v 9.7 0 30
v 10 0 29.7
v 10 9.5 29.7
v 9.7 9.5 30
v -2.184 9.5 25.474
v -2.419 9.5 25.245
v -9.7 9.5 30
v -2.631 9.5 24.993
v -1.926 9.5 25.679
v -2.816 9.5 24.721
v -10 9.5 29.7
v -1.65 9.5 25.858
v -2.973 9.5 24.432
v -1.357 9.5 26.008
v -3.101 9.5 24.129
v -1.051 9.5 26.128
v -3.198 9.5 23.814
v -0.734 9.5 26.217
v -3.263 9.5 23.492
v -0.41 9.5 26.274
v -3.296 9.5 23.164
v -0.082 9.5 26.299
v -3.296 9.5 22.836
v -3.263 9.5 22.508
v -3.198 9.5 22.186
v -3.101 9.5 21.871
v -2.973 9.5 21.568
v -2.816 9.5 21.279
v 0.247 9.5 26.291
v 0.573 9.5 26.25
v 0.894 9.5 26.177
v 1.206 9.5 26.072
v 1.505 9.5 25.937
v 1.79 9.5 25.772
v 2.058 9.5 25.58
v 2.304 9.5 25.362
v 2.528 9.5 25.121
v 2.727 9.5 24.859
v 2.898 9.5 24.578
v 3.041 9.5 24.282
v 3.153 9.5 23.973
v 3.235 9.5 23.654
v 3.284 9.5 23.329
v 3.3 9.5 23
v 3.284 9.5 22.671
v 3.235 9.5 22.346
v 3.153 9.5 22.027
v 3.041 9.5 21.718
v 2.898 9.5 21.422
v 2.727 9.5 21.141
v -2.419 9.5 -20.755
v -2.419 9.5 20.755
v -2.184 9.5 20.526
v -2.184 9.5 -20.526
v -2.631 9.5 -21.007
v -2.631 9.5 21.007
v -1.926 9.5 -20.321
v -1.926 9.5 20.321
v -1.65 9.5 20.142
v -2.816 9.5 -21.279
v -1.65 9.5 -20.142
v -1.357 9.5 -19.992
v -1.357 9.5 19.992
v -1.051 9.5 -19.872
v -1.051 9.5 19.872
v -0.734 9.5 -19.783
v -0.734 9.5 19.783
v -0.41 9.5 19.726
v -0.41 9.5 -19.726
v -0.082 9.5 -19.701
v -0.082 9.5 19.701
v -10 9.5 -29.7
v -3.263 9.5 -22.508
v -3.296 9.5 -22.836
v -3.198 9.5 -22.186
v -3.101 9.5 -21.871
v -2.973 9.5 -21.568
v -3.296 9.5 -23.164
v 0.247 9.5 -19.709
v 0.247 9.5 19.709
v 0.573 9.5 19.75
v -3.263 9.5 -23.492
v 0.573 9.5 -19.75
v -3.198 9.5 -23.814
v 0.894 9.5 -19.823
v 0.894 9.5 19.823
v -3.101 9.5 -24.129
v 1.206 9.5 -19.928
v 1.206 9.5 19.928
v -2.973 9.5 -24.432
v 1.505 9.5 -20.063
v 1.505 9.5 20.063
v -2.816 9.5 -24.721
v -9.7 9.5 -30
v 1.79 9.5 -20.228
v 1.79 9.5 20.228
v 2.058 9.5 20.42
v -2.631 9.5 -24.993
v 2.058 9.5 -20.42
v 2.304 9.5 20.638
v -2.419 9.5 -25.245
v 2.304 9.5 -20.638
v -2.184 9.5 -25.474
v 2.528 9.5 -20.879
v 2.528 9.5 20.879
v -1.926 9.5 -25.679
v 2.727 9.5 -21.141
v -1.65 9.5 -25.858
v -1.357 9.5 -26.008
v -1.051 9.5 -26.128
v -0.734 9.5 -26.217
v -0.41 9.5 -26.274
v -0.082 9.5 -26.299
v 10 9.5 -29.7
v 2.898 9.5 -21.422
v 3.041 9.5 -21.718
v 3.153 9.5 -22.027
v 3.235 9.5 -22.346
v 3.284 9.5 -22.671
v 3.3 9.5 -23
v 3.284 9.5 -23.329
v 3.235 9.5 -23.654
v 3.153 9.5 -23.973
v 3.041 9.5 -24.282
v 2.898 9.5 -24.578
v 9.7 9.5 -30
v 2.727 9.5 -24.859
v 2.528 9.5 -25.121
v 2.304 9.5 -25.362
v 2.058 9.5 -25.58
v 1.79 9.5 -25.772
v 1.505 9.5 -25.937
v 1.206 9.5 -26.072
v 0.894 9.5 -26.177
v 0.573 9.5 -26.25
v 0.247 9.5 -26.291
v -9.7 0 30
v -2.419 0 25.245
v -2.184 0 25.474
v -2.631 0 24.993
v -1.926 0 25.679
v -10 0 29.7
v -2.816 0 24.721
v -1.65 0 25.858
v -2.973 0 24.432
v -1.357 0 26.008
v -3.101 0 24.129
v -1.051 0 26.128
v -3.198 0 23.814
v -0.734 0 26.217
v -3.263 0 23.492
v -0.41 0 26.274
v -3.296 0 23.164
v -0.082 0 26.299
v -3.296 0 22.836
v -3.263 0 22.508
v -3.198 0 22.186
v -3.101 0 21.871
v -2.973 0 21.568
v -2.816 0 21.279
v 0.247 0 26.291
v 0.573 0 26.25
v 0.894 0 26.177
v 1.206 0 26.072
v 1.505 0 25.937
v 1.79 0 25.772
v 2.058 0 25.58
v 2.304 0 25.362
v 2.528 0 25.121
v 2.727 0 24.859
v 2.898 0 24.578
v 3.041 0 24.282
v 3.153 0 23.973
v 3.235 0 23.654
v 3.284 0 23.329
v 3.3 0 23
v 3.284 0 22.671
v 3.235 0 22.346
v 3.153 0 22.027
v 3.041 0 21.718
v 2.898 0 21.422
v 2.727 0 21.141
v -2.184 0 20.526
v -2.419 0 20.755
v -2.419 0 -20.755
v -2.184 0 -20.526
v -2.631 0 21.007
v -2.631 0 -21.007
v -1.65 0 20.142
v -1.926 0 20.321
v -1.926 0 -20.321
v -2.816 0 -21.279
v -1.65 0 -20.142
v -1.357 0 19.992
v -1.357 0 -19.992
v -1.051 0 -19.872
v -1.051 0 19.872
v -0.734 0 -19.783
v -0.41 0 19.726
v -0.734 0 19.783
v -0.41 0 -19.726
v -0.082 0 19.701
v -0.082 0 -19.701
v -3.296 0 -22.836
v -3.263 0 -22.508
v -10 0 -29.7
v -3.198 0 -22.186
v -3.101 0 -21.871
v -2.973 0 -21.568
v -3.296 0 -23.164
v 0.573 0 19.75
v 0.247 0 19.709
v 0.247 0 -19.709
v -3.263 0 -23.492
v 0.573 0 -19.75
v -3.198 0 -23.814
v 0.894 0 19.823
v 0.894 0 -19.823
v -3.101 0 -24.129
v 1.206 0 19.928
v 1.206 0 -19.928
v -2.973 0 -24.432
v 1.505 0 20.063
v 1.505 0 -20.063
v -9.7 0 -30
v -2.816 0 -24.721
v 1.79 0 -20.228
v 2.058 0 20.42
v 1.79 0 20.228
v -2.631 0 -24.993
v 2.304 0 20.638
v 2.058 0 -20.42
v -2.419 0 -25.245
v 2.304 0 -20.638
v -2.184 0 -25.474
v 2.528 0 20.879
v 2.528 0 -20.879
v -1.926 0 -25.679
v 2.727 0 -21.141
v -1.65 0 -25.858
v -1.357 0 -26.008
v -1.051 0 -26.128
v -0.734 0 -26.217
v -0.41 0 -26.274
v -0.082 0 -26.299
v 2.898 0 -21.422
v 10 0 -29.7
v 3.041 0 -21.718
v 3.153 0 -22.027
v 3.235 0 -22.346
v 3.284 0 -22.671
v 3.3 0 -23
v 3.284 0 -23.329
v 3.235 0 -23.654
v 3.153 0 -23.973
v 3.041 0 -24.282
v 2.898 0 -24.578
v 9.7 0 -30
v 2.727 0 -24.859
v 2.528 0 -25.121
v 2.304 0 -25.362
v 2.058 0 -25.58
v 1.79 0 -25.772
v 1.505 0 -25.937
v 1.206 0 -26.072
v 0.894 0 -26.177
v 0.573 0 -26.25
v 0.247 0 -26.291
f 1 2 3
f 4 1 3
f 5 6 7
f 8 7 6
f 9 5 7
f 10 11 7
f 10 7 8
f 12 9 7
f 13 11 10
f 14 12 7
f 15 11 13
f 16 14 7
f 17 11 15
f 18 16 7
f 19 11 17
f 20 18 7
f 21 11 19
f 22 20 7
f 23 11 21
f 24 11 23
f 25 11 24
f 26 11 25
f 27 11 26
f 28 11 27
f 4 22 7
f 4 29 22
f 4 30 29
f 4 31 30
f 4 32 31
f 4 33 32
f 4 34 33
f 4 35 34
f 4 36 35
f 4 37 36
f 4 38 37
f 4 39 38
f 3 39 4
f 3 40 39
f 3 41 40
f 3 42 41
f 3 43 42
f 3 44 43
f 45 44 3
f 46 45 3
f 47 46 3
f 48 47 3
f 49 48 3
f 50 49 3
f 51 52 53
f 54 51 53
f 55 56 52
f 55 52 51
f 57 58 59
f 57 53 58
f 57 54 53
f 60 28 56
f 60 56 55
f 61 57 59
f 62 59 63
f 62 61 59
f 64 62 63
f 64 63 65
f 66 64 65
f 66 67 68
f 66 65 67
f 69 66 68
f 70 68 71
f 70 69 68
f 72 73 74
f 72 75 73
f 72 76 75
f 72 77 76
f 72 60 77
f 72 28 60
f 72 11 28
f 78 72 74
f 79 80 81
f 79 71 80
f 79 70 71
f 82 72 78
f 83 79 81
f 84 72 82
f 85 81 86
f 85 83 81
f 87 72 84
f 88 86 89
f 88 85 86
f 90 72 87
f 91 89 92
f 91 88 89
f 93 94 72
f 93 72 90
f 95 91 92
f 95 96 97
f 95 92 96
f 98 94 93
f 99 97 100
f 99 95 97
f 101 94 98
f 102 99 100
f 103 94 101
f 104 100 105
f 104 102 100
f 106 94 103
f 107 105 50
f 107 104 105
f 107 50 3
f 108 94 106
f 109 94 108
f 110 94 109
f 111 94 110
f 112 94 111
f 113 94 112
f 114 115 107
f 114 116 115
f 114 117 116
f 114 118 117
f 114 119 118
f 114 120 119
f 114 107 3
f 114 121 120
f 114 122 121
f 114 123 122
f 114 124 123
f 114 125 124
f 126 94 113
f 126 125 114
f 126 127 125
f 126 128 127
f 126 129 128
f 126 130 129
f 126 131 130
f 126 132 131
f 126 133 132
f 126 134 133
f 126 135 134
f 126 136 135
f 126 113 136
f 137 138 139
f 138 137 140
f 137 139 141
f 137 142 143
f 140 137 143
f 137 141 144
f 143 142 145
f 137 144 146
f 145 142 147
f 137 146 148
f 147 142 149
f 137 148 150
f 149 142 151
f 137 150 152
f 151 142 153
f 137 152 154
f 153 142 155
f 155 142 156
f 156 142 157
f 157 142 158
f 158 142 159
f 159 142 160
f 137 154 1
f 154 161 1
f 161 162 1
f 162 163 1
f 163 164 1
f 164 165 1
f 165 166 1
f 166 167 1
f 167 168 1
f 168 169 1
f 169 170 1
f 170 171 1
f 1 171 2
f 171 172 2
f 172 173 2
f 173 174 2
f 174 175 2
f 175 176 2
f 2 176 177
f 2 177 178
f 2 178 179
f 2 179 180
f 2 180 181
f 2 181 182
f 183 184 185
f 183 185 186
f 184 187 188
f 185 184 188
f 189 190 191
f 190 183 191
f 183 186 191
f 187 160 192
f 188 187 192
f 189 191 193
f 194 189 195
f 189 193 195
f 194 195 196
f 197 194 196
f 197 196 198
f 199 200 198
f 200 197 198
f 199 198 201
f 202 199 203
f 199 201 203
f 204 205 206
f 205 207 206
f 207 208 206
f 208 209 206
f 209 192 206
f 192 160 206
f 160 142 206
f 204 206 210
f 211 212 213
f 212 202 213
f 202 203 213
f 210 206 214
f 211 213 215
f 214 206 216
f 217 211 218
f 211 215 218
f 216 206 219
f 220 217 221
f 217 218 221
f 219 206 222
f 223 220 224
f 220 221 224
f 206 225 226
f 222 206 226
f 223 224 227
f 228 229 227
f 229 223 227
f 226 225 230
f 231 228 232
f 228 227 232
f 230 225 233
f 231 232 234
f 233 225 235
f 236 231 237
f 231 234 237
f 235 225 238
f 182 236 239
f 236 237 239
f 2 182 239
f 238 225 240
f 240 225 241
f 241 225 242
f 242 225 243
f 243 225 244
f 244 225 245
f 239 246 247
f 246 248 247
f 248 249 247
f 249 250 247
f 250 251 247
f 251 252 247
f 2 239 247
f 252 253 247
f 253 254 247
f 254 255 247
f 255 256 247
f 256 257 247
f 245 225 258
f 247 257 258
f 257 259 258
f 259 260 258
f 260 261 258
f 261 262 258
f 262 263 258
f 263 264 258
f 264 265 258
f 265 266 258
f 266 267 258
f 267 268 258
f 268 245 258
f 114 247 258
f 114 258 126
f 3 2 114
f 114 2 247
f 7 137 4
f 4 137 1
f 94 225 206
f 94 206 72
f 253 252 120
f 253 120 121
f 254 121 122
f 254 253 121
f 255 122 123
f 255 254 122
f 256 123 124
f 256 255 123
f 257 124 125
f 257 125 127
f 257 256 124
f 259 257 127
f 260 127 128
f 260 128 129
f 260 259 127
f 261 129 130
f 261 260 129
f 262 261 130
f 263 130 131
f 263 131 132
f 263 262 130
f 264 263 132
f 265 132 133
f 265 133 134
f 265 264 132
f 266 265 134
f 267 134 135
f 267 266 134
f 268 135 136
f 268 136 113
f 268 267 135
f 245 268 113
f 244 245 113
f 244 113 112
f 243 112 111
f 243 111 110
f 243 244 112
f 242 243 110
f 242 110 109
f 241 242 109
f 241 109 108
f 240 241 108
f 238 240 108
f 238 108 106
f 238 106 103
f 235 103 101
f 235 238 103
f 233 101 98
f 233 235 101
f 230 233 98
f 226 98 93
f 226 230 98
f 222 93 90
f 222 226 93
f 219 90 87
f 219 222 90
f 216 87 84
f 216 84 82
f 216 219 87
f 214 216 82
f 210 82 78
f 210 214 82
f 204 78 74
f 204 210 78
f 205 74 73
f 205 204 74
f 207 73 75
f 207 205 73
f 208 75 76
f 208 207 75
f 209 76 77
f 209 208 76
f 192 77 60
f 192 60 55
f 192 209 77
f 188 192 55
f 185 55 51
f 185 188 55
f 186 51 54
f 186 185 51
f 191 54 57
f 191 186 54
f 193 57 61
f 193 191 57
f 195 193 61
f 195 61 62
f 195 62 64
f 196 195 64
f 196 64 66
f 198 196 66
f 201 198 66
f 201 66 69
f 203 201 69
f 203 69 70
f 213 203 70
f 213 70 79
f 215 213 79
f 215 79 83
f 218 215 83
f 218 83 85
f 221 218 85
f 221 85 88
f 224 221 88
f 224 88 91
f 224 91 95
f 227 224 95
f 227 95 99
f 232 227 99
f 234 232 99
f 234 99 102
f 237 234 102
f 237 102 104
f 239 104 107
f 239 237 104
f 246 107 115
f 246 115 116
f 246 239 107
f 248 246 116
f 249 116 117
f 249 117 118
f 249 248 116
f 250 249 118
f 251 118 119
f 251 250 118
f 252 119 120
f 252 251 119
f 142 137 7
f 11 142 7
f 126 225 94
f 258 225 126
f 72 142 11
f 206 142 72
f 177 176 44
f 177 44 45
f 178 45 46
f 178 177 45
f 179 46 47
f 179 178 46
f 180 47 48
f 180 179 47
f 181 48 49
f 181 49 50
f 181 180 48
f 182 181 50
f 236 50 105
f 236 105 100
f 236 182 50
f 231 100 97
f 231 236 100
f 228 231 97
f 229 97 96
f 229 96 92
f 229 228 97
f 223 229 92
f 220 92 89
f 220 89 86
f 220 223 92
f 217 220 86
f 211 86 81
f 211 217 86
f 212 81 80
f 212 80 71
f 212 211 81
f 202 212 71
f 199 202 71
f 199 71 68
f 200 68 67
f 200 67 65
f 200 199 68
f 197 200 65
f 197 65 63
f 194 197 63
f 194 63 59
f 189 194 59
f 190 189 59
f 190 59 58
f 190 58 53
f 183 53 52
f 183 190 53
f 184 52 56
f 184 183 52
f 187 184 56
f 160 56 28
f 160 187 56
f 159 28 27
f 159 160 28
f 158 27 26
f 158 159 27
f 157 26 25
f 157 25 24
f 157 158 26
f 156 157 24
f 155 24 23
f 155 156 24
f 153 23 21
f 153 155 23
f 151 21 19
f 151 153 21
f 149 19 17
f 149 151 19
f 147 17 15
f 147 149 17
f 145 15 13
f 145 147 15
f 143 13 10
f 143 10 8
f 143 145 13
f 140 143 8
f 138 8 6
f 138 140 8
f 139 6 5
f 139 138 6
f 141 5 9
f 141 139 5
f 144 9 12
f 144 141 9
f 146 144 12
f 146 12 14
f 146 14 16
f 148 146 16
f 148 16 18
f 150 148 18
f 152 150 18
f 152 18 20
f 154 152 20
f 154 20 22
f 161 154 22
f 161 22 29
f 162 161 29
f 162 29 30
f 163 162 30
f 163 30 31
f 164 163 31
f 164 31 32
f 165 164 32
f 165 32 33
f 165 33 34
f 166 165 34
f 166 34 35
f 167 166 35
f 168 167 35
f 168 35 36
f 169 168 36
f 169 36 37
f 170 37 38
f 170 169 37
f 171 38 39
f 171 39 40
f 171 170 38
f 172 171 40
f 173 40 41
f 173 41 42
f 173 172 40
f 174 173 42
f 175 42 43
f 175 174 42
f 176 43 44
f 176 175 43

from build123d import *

# Parameters (mm, degrees)
SKETCH1_W           = 20
SKETCH1_H           = 60
SKETCH1_R           = 3.3
BOSS_EXTRUDE1_DEPTH = 9.5
CHAMFER1_SIZE       = 0.3


with BuildPart() as part:
    # Sketch1 → Boss-Extrude1 (new body)
    with BuildSketch(Plane(origin=(0, 0, 0), x_dir=(1, 0, 0), z_dir=(0, 1, 0))):
        Rectangle(SKETCH1_W, SKETCH1_H)
        with Locations((0, 23)):
            Circle(SKETCH1_R, mode=Mode.SUBTRACT)
        with Locations((0, -23)):
            Circle(SKETCH1_R, mode=Mode.SUBTRACT)
    extrude(amount=BOSS_EXTRUDE1_DEPTH)

    # Chamfer1
    chamfer1_edges = [part.edges().sort_by_distance(p)[0] for p in [
        (-10, 4.75, -30),
        (10, 4.75, -30),
        (10, 4.75, 30),
        (-10, 4.75, 30),
    ]]
    chamfer(chamfer1_edges, length=CHAMFER1_SIZE)


solid = part.part
